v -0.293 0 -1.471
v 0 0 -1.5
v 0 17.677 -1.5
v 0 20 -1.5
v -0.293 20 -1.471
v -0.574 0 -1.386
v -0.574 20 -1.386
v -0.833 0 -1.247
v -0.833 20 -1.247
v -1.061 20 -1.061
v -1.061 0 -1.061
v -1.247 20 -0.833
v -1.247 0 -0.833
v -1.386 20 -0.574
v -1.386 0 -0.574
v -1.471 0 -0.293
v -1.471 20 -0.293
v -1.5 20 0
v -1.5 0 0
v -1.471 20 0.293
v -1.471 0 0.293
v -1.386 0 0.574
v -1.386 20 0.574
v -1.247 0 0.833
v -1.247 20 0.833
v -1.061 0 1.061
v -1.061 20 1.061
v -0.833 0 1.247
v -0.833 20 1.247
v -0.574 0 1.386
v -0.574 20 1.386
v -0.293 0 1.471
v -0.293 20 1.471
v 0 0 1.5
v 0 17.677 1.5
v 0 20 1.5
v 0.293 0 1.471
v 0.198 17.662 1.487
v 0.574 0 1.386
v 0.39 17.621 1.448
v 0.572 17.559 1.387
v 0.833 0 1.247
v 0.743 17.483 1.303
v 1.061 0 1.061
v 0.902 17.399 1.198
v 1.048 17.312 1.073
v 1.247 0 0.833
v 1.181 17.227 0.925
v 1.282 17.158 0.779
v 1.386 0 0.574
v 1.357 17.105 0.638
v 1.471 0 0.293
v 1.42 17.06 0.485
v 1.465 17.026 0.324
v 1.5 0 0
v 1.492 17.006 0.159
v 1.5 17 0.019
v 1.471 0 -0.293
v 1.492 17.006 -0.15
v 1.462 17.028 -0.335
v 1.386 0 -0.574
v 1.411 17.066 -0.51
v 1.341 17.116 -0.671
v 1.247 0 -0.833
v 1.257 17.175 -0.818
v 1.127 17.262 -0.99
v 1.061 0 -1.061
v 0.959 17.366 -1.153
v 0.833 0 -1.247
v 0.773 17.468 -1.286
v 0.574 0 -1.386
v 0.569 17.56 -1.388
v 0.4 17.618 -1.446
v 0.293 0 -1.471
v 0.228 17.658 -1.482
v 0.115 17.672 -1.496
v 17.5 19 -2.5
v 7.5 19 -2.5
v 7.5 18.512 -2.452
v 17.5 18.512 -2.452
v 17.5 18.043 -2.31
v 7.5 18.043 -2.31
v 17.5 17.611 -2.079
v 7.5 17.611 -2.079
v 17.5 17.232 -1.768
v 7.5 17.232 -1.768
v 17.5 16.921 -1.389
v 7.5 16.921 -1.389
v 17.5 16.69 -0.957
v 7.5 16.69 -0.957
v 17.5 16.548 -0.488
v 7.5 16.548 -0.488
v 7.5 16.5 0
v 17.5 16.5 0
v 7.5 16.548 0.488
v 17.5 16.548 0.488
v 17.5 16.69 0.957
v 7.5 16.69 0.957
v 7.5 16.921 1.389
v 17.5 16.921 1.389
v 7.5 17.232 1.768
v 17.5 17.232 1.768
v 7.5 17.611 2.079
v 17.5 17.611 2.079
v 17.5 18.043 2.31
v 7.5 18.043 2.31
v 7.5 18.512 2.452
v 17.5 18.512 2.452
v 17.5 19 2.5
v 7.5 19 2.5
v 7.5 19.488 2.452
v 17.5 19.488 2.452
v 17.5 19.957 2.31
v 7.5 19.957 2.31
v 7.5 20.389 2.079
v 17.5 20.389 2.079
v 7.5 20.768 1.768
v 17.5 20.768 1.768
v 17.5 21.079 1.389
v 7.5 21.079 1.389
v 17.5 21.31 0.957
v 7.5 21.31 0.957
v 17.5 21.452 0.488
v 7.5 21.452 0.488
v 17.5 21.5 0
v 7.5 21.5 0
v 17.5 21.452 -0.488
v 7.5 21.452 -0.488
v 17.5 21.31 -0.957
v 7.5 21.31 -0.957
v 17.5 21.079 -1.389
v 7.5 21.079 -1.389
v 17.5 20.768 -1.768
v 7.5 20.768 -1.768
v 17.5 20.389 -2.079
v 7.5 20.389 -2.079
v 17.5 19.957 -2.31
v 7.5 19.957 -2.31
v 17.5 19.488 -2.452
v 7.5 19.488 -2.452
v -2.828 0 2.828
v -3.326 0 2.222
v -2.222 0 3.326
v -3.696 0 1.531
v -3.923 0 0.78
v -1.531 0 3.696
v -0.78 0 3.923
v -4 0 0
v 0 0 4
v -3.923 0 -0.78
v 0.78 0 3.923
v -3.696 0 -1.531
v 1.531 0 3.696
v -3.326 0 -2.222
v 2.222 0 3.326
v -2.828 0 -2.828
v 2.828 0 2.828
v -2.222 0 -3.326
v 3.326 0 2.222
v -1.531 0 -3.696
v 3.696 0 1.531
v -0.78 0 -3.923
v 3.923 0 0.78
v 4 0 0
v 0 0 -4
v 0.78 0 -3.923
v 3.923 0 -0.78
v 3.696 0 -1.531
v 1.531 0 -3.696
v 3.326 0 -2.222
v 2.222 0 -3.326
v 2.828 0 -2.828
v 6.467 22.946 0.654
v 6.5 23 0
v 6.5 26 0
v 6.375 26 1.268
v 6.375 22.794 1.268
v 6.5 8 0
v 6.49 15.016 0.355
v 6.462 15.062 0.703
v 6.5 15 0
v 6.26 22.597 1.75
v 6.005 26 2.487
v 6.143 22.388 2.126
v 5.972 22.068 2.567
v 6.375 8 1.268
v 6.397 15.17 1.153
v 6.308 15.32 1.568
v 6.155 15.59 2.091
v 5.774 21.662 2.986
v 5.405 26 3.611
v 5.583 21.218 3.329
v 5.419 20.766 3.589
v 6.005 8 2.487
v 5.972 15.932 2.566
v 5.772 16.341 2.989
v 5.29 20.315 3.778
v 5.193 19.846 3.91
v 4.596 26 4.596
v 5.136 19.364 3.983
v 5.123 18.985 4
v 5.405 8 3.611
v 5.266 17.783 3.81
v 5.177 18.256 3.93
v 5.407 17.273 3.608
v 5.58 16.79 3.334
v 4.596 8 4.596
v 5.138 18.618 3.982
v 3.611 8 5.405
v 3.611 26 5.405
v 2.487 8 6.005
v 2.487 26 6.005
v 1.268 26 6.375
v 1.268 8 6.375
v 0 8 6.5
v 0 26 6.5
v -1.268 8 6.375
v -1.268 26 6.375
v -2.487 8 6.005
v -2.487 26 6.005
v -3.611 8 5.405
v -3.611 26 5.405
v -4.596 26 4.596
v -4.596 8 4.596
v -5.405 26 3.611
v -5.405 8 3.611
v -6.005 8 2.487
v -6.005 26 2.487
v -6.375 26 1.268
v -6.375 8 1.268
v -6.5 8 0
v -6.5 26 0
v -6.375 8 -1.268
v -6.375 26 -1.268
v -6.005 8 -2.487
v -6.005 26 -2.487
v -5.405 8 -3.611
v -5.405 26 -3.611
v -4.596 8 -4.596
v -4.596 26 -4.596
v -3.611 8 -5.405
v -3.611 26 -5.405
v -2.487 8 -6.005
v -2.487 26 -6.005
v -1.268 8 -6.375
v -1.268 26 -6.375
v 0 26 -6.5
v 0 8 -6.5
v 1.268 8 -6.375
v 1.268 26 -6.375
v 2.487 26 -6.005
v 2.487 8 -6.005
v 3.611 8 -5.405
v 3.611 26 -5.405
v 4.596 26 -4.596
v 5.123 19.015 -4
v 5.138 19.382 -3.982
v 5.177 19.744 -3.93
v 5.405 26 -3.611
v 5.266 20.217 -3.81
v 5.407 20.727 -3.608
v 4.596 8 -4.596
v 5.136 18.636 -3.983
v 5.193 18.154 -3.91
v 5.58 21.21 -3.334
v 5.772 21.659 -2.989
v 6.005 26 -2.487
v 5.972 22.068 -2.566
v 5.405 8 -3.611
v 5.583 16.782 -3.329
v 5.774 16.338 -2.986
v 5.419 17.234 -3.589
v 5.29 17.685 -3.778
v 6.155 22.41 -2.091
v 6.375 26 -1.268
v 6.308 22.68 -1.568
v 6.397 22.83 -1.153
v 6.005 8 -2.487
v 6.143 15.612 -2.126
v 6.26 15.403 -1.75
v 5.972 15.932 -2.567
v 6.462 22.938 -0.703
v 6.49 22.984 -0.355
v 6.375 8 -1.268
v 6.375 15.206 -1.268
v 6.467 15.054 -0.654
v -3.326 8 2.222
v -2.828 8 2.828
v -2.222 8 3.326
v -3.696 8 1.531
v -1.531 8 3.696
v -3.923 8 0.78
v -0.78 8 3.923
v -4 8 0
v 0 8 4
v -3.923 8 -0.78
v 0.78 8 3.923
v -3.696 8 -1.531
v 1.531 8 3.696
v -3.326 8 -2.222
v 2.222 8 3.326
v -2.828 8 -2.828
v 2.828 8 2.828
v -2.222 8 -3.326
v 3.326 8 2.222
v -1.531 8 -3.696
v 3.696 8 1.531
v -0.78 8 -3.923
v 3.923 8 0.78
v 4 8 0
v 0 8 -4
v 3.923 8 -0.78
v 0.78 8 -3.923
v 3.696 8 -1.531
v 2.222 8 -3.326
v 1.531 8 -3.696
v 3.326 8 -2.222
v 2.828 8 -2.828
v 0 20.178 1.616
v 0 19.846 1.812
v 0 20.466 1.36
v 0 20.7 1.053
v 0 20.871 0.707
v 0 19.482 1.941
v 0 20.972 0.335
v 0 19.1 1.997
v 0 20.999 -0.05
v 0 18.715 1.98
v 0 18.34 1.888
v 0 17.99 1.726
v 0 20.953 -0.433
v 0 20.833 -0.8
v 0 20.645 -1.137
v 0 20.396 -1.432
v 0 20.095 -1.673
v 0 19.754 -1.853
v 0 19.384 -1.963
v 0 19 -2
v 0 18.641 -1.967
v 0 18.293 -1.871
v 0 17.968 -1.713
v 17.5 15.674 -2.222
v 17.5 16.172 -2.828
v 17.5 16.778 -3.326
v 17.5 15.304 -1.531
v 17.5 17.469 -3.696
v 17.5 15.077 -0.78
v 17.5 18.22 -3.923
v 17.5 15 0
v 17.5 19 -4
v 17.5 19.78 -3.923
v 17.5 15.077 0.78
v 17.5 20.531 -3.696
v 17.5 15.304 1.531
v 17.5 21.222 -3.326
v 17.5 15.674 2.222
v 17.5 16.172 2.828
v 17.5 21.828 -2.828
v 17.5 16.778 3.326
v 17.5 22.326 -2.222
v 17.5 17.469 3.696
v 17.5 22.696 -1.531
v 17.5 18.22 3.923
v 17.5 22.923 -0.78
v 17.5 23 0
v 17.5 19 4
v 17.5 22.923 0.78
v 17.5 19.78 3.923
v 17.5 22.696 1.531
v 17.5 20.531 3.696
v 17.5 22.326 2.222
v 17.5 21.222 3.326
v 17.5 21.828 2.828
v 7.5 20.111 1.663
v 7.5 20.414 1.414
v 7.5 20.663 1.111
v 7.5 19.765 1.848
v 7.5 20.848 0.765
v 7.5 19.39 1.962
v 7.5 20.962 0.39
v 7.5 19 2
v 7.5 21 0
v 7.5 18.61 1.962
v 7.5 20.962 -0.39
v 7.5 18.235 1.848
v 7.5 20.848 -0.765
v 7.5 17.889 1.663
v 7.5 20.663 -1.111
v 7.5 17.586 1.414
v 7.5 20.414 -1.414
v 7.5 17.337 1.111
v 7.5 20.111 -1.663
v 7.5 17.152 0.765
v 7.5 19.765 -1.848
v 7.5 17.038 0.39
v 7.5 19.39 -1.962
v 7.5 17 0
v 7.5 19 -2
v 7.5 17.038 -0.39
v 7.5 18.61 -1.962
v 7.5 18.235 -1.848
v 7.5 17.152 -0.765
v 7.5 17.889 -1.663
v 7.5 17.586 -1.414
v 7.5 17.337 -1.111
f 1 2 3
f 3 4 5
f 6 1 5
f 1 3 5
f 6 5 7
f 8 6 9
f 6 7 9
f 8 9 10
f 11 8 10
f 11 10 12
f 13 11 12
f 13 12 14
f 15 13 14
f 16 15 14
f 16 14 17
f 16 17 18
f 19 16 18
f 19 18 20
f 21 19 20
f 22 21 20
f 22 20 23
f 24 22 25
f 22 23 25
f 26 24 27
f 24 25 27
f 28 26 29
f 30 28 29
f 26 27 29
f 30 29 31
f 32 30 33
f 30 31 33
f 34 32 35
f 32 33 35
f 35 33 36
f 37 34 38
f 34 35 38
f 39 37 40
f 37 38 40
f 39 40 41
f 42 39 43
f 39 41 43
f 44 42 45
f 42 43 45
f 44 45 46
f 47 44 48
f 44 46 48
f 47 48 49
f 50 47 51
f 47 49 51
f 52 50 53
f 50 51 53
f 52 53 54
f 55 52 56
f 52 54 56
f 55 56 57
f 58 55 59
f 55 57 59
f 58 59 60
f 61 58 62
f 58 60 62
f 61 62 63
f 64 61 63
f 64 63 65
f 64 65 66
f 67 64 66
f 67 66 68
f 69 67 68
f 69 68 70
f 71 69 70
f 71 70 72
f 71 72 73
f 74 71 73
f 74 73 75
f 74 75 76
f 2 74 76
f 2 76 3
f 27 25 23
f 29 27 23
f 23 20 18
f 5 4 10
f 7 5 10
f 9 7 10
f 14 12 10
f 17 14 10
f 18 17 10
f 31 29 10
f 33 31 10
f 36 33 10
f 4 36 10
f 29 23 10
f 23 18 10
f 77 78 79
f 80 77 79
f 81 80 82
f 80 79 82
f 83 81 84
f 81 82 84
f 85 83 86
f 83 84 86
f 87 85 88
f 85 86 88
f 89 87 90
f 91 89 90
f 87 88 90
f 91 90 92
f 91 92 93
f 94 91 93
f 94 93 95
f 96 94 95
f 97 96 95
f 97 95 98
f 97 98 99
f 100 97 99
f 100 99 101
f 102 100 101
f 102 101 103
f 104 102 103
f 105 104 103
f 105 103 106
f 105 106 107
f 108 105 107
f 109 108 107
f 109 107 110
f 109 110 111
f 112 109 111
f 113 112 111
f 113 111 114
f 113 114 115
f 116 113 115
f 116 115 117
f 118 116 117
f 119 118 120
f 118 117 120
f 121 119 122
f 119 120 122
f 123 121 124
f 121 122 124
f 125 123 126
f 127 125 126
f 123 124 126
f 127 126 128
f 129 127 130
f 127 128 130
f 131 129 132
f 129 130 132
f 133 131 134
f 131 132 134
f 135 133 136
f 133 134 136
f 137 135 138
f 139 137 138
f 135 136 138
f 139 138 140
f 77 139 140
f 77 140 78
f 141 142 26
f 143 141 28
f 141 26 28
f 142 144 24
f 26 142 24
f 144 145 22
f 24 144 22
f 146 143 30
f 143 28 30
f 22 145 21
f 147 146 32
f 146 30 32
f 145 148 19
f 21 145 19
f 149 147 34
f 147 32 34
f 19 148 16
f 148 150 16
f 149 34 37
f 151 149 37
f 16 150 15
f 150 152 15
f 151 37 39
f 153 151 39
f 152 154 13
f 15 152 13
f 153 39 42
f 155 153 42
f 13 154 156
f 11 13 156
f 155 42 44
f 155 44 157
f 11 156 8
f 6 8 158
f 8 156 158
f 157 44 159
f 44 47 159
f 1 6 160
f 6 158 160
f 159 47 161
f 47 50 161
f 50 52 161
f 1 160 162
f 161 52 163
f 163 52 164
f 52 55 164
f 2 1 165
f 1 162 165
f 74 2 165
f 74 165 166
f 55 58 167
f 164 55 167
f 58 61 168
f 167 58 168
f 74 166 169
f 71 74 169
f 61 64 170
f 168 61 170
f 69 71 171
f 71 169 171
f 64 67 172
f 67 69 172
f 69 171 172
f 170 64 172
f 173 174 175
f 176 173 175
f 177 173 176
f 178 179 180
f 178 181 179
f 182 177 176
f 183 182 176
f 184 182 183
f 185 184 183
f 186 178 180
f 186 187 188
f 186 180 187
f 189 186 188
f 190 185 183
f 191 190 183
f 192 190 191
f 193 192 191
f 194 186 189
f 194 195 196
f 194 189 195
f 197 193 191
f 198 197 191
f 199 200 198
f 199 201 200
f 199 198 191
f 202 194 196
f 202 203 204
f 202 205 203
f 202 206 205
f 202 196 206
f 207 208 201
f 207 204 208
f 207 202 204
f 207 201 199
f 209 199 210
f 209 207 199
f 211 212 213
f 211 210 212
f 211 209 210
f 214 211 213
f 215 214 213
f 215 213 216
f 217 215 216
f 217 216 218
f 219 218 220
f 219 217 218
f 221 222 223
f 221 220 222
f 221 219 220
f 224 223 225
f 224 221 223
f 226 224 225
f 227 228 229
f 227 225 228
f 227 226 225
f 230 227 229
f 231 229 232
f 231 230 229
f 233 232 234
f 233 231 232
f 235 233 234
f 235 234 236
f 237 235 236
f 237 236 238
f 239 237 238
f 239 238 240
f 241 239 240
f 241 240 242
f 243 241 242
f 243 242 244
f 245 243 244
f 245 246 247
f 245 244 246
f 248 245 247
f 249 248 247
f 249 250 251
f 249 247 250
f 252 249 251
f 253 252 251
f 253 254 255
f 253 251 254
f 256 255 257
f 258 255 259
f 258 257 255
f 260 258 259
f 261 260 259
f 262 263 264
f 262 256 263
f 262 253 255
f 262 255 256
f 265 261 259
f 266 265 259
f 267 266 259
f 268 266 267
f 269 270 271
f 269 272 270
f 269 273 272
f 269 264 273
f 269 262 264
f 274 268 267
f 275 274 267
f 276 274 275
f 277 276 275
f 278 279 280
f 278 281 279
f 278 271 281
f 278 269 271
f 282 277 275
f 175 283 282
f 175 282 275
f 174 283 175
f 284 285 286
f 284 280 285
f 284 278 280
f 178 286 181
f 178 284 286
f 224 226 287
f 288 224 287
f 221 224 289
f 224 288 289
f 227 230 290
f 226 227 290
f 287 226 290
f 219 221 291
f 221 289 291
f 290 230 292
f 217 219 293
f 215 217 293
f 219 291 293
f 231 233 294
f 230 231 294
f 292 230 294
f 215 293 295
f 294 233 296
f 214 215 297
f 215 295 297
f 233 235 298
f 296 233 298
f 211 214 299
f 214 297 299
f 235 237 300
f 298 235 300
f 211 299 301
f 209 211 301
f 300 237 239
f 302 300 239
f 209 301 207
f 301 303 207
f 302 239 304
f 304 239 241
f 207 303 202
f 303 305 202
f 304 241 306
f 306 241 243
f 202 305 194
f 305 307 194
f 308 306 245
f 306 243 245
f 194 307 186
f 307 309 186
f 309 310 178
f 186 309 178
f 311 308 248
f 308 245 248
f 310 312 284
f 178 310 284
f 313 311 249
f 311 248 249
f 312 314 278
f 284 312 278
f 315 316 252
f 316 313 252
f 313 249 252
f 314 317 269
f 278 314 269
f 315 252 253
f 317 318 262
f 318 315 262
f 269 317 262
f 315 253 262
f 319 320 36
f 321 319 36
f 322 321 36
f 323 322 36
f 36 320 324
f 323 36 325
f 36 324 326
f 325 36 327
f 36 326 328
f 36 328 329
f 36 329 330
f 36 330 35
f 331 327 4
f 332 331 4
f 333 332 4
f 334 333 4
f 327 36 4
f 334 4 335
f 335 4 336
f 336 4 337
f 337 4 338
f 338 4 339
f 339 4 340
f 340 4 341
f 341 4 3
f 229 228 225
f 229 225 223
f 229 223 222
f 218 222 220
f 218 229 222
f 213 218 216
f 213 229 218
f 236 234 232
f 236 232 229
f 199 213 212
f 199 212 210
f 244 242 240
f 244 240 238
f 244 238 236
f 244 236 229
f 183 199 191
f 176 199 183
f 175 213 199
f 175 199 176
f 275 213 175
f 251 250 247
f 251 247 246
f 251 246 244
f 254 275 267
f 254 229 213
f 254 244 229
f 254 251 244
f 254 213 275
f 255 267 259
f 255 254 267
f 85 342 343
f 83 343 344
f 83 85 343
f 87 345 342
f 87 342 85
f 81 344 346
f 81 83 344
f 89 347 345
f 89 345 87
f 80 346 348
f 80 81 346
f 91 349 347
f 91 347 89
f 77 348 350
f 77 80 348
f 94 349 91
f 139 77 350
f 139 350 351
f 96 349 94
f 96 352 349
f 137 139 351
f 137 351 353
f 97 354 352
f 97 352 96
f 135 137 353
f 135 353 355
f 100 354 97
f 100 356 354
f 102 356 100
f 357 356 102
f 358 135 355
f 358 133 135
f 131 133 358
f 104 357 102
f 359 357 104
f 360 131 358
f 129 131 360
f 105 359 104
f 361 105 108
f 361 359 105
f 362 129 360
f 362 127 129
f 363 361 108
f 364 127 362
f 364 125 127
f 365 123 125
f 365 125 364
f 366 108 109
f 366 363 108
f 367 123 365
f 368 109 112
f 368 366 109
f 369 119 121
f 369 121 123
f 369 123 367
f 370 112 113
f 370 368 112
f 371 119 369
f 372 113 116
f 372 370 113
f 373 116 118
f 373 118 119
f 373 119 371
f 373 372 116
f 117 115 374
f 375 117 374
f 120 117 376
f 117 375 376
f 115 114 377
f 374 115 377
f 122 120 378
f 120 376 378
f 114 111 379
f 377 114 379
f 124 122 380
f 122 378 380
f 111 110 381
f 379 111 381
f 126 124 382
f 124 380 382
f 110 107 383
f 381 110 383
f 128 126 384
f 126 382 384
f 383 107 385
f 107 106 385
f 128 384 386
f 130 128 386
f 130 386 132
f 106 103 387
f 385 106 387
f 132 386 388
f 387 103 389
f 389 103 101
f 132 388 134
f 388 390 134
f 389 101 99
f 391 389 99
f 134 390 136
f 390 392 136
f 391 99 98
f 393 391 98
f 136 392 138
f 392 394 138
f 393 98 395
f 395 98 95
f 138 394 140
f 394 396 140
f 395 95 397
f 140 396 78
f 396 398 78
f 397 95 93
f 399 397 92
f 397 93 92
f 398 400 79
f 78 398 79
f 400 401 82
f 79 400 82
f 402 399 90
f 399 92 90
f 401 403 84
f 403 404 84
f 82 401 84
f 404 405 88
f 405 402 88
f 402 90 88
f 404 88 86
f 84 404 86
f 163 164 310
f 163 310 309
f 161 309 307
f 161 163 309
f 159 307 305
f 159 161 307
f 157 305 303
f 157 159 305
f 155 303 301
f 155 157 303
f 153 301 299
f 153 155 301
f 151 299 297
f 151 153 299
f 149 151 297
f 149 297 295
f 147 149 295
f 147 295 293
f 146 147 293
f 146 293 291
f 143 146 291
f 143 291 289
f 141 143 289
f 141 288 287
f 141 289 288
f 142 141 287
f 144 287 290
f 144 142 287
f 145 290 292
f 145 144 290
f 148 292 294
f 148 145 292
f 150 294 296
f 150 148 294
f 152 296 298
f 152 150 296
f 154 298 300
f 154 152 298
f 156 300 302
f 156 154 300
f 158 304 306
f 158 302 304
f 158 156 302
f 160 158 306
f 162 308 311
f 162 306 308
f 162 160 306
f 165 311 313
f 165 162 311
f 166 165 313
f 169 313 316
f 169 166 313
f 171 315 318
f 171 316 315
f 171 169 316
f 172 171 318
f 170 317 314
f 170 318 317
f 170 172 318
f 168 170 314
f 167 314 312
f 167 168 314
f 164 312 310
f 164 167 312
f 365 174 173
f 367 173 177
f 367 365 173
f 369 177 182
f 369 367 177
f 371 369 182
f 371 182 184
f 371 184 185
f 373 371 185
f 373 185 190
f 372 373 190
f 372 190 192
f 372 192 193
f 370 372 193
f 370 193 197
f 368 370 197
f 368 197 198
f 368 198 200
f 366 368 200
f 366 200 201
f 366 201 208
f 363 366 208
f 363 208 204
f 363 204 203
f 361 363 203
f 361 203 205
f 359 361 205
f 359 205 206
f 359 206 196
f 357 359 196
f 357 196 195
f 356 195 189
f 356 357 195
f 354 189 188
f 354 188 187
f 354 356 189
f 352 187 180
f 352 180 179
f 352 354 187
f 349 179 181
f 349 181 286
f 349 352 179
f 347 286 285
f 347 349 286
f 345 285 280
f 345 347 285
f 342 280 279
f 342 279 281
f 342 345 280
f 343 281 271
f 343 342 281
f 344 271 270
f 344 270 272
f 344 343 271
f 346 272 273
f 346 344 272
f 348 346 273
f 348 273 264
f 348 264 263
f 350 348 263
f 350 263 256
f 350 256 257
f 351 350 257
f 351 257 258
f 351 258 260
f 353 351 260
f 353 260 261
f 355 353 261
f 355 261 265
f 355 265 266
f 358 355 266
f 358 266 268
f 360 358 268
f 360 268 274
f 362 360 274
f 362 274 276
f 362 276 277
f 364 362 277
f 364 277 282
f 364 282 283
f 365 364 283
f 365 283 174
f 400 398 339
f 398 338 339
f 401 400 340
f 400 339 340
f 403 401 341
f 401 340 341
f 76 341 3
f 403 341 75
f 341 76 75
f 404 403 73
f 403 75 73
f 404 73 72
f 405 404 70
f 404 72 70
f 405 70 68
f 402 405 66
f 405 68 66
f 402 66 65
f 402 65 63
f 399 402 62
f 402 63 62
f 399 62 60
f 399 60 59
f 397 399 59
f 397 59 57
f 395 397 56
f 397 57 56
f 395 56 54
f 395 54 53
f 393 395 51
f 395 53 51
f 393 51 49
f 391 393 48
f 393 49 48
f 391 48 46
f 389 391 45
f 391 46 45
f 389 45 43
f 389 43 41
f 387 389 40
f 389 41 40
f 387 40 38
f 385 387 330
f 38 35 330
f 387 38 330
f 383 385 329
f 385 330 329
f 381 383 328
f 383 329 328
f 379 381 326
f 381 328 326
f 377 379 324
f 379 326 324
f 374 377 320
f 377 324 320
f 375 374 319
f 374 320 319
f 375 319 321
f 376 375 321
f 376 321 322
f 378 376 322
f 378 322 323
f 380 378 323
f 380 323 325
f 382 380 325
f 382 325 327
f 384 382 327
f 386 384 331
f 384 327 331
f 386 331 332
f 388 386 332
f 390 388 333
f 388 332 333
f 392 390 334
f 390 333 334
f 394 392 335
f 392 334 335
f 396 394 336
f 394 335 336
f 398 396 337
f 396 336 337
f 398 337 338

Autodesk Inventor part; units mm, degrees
ref_plane "XZ Plane" through (0, 0, 0) normal (0, 1, 0) x (-1, 0, 0)
ref_plane "XY Plane" through (0, 0, 0) normal (0, 0, 1) x (1, 0, 0)
sketch "Sketch1" plane through (0, 0, 0) normal (0, 0, 1) x (1, 0, 0)
  line L0 (0, 0) -> (0, 26)
  line L1 (0, 26) -> (6.5, 26)
  line L2 (6.5, 26) -> (6.5, 8)
  line L3 (6.5, 8) -> (4, 8)
  line L4 (4, 8) -> (4, 0)
  line L5 (4, 0) -> (0, 0)
  dimension "d0" = 13
  dimension "d1" = 8
  dimension "d2" = 8
  dimension "d3" = 18
revolve "Revolution1" add sketch "Sketch1" angle 360 about axis through (0, 0, 0) along (0, 1, 0)
thread "Thread1" size "M8x1.25" class "6g" standard "ISO Metric profile" full length
ref_plane "Work Plane1" through (17.5, 0, 0) normal (1, 0, 0) x (0, 1, 0)
sketch "Sketch2" plane through (17.5, 0, 0) normal (1, 0, 0) x (0, 1, 0)
  line L0 (26, -6.5) -> (26, 6.5) projected
  line L1 (8, 6.5) -> (26, 6.5) projected
  line L2 (8, -6.5) -> (26, -6.5) projected
  line L3 (8, -6.5) -> (8, 6.5) projected
  circle A0 centre (19, 0) radius 4
  point P0 (0, 0)
  point P1 (26, 0)
  dimension "d8" = 8
  dimension "d9" = 7
extrude "Extrusion1" add sketch "Sketch2" against normal up to surface contours A0
sketch "Sketch3" plane through (17.5, 19, 0) normal (1, 0, 0) x (0, 0, -1)
  circle A0 centre (0, 0) radius 4 projected
  point P0 (0, -19)
hole "Hole1" at (17.5, 19, 0) direction (-1, 0, 0) diameter 4 depth 17.5 counterbore diameter 5 counterbore depth 10
sketch "Sketch4" plane through (0, 0, 0) normal (0, -1, 0) x (1, 0, 0)
  circle A0 centre (0, 0) radius 4 projected
  point P0 (0, 0)
hole "Hole2" at (0, 0, 0) direction (0, 1, 0) diameter 3 depth 20
thread "Thread2" size "M8x1.25" class "6g" standard "ISO Metric profile" length 15
properties part number "157" material "Iron, Cast"
